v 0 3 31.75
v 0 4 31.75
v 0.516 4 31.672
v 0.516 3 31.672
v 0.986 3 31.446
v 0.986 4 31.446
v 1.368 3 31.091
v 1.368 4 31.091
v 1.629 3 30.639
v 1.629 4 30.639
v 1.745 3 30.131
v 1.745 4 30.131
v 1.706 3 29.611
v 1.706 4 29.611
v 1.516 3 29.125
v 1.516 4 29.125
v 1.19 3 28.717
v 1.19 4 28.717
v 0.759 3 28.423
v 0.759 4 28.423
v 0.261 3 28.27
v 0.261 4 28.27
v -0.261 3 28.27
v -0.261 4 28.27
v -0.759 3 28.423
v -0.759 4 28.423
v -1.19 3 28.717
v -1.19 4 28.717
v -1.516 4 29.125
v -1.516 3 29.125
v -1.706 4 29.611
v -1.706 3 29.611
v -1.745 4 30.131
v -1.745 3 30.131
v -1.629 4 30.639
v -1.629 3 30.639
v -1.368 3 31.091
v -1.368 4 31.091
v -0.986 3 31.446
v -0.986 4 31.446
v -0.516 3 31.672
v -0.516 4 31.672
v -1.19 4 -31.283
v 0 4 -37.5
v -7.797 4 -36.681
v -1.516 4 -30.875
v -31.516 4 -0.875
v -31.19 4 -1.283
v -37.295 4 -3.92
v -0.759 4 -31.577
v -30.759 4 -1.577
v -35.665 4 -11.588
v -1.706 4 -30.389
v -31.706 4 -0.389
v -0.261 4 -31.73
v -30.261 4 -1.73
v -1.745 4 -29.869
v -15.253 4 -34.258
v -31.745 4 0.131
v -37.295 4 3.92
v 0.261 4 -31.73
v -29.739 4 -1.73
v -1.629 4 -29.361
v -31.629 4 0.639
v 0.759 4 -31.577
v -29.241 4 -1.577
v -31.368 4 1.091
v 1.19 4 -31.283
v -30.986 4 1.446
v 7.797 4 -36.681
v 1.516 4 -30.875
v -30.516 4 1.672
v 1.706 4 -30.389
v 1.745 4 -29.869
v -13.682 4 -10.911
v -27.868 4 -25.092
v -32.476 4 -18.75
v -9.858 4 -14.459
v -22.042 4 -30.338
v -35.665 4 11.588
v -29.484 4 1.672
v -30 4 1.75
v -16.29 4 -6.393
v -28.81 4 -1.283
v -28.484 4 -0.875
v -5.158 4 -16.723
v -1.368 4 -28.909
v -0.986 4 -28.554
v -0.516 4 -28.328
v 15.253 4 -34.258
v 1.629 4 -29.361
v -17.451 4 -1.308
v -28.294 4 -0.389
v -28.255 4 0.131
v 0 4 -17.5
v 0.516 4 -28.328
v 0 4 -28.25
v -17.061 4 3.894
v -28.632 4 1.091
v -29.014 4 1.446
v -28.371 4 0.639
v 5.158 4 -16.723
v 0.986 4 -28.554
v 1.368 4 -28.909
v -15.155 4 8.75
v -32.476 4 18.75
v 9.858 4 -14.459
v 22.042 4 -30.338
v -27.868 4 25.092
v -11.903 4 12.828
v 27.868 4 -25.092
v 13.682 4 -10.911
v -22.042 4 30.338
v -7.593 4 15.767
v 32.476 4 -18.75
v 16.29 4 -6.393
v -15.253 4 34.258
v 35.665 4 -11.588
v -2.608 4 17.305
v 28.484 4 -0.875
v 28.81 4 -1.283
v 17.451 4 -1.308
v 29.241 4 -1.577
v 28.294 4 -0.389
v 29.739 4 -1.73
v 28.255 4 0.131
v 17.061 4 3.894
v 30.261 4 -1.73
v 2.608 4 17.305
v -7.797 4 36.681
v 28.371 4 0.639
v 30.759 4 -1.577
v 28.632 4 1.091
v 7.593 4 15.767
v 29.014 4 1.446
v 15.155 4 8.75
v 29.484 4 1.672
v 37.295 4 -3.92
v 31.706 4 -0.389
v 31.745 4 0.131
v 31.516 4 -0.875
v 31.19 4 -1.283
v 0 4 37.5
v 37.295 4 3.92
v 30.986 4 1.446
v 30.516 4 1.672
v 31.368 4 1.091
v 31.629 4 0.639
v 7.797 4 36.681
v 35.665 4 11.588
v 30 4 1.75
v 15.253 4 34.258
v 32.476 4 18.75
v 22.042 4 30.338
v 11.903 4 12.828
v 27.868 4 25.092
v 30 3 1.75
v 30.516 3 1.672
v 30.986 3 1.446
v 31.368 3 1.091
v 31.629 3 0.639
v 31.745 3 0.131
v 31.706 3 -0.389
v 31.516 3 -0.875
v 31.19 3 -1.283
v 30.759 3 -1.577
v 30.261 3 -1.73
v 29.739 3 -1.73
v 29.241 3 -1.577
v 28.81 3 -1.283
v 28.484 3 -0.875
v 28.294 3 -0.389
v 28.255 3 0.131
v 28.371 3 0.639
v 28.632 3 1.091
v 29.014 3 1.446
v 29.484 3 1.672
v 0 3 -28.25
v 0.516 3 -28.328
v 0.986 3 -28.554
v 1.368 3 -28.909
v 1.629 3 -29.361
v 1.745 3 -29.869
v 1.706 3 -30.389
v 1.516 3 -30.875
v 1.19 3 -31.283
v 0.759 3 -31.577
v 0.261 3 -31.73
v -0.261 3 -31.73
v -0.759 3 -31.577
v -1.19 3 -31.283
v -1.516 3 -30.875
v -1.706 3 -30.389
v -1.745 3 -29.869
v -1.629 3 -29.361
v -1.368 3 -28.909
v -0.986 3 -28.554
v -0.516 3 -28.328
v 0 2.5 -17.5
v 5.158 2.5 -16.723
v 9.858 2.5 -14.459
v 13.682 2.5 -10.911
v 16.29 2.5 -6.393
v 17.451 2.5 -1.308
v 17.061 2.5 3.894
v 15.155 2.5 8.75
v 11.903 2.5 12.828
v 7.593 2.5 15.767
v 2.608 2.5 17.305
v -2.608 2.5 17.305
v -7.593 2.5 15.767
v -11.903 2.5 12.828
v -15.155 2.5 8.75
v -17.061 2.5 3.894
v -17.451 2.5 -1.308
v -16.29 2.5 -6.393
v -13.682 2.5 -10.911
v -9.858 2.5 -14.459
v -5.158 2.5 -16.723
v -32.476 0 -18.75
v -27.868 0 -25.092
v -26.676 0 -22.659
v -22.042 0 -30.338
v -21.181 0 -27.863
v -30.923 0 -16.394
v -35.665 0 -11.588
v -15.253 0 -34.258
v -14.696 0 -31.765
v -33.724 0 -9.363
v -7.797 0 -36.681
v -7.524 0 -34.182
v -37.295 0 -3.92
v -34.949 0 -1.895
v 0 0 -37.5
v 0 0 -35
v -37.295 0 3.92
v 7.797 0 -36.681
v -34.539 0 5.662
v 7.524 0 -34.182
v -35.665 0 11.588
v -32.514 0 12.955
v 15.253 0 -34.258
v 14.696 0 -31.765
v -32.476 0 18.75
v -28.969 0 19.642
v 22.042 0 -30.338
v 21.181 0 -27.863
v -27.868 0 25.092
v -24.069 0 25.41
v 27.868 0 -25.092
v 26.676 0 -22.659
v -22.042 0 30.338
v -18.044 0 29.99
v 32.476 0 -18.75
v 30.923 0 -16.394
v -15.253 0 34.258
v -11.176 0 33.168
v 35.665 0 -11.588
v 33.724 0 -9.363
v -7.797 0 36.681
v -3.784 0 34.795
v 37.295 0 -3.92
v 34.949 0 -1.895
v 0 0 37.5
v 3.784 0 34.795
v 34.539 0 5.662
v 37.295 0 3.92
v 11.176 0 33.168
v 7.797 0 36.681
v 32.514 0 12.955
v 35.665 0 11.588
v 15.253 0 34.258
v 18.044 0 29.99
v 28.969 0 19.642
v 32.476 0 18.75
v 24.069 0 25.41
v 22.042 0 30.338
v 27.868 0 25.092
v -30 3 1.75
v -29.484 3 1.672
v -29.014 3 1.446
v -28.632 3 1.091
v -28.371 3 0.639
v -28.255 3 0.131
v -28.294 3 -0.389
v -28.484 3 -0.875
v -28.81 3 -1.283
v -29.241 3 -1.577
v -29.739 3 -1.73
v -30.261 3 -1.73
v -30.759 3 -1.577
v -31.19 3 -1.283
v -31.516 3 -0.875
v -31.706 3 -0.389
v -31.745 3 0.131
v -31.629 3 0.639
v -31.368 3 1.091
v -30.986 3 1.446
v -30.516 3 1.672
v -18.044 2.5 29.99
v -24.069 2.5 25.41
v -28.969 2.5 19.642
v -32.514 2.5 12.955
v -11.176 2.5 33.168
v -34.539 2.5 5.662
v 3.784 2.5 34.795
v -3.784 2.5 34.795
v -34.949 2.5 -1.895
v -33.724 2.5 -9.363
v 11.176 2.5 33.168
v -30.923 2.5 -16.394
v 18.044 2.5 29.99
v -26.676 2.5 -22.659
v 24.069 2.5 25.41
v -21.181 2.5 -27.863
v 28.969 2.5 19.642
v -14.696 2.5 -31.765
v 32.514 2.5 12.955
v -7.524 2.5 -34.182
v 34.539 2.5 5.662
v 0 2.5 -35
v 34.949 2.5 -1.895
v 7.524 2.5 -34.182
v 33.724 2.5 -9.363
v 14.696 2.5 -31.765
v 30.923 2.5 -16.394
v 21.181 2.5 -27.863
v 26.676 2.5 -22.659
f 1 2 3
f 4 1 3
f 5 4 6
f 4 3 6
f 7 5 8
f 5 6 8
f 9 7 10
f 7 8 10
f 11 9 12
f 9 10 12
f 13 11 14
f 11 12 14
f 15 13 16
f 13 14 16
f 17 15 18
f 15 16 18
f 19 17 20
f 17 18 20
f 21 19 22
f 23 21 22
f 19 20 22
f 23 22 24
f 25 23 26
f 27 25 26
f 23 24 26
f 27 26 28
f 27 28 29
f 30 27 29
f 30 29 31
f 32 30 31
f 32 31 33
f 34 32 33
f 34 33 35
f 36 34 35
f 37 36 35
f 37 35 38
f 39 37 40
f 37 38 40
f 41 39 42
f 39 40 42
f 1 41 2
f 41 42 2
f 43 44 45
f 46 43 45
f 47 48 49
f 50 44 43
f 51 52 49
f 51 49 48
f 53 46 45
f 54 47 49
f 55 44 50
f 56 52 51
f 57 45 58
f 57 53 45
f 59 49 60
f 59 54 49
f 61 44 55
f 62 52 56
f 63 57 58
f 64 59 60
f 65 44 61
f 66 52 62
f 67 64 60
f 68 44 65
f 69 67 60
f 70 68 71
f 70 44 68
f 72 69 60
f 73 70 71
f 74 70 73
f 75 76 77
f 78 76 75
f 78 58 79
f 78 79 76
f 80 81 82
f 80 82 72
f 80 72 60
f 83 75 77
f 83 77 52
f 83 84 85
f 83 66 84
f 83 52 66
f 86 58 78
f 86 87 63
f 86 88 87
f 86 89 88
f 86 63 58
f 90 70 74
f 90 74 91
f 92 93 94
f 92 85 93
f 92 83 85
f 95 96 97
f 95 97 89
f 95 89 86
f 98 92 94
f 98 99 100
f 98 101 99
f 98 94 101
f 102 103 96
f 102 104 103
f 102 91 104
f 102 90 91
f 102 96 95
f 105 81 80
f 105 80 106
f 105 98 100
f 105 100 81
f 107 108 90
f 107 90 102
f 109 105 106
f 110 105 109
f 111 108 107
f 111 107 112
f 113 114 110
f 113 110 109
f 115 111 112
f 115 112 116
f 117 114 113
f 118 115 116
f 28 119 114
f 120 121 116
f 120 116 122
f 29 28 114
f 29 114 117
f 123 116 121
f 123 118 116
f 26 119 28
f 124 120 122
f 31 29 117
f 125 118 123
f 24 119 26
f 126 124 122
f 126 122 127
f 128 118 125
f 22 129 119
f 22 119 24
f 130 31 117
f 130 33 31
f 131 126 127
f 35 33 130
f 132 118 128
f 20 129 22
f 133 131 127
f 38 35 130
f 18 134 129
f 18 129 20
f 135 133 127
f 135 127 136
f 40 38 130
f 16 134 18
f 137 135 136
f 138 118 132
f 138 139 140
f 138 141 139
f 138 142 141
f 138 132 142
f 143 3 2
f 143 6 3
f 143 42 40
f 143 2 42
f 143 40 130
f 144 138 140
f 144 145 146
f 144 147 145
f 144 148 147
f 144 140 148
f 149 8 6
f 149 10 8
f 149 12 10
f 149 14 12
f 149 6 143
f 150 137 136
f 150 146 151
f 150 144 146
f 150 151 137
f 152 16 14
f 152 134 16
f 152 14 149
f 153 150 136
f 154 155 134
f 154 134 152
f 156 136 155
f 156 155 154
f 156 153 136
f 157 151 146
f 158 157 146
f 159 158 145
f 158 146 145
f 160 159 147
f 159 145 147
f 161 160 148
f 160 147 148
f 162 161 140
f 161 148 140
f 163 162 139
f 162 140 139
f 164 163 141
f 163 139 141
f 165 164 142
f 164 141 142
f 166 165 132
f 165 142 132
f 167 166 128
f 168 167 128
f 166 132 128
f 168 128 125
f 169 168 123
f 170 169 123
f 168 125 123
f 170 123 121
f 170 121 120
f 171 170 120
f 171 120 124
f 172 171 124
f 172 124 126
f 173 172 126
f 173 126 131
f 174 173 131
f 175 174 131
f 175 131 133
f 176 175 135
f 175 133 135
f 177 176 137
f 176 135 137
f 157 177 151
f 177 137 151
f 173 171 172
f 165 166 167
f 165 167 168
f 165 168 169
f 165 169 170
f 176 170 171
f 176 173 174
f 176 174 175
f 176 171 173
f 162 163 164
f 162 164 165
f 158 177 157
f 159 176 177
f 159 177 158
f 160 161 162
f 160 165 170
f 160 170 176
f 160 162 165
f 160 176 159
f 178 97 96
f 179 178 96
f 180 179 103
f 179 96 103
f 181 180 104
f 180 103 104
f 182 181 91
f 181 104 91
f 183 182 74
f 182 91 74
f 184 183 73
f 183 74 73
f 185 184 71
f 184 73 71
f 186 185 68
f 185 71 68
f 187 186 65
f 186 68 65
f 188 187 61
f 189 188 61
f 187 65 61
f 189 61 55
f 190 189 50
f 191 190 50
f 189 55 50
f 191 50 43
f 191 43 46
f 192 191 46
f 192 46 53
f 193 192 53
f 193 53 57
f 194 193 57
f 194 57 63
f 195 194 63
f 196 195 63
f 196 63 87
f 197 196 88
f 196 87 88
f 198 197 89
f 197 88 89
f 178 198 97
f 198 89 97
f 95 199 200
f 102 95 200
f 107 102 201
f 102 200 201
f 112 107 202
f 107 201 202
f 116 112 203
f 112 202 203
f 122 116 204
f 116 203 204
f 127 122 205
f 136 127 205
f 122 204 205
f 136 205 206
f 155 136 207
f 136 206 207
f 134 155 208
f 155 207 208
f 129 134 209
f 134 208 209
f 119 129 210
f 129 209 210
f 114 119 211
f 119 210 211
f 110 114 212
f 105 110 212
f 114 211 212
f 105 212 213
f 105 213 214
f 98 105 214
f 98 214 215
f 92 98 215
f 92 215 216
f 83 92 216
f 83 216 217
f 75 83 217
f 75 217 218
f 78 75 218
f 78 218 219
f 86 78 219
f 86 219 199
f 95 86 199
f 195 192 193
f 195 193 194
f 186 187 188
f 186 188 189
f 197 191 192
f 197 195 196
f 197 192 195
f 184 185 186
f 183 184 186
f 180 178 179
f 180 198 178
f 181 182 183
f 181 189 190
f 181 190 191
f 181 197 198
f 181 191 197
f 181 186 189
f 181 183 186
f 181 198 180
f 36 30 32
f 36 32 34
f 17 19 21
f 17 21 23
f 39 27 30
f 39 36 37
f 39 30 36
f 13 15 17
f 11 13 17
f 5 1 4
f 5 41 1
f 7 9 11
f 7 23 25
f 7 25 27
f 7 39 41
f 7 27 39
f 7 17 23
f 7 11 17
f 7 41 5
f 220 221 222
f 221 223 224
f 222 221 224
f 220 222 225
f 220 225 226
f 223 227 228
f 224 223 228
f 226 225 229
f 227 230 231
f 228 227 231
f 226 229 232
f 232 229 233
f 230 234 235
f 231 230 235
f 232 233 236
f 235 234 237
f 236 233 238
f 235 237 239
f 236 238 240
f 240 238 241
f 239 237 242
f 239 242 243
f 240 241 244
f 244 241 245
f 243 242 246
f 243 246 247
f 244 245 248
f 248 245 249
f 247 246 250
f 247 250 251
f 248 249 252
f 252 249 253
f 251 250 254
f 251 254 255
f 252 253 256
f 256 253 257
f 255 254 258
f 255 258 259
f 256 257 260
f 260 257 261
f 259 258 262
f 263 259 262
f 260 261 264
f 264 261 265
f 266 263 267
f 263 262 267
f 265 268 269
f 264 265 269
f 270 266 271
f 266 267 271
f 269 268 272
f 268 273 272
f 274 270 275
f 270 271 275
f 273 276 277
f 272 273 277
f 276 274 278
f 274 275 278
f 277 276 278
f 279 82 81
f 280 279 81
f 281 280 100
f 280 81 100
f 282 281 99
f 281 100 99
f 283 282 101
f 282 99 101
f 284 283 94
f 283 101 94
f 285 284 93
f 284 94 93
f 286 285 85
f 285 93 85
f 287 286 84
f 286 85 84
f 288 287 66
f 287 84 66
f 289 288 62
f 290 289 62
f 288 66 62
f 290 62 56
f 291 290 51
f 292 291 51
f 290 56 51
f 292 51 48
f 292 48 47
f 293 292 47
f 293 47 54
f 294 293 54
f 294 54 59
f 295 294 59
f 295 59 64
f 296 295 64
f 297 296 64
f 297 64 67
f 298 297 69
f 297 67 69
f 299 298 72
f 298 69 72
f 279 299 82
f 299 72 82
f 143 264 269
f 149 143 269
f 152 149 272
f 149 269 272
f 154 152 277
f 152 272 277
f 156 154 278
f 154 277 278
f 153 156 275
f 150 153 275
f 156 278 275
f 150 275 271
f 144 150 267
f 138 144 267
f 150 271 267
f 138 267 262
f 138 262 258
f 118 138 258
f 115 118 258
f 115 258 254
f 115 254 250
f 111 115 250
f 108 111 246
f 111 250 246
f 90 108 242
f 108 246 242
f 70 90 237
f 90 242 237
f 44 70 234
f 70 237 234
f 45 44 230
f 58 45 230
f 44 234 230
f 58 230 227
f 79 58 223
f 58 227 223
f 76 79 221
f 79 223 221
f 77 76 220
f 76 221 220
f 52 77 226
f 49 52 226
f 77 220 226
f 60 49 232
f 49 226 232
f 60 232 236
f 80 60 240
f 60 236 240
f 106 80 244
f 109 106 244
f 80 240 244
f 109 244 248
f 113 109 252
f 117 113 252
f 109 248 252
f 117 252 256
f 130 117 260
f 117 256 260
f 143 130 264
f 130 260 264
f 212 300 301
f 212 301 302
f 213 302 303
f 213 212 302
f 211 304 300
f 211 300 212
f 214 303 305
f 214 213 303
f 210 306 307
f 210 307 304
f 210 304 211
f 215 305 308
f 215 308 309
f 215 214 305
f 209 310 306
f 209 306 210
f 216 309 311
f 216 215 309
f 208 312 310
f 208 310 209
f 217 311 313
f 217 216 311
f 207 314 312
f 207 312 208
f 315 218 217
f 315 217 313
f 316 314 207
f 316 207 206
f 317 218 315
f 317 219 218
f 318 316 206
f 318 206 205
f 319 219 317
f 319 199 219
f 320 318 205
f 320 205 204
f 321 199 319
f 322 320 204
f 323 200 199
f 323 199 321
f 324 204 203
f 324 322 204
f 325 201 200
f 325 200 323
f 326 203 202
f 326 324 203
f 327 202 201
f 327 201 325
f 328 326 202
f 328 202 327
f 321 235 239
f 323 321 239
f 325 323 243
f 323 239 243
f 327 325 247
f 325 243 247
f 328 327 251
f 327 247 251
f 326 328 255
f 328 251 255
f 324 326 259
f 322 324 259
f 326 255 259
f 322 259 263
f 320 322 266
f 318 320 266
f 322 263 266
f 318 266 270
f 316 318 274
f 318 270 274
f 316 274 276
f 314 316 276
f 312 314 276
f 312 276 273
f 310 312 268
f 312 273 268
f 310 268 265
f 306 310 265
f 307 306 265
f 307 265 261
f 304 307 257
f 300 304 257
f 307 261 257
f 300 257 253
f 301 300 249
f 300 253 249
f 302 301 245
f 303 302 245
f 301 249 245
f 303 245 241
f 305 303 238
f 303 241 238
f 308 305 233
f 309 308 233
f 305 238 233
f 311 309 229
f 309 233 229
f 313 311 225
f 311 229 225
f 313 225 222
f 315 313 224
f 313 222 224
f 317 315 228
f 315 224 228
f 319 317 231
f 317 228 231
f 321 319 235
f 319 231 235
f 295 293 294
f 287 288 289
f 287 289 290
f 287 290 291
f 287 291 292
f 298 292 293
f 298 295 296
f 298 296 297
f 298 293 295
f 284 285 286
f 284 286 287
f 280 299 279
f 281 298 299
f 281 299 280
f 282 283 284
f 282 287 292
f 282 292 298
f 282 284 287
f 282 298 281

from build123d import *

# Parameters (mm, degrees)
SKETCH1_R           = 37.5
BOSS_EXTRUDE1_DEPTH = 4
SKETCH2_R           = 1.75
CUT_EXTRUDE1_DEPTH  = 1
SKETCH3_R           = 35
CUT_EXTRUDE5_DEPTH  = 2.5
SKETCH4_R           = 17.5
CUT_EXTRUDE6_DEPTH  = 54.091901454


with BuildPart() as part:
    # Sketch1 → Boss-Extrude1 (new body)
    with BuildSketch(Plane(origin=(0, 0, 0), x_dir=(1, 0, 0), z_dir=(0, 1, 0))):
        with Locations(Location((0, 0, 0), (0, 0, 270))):
            Circle(SKETCH1_R)
    extrude(amount=BOSS_EXTRUDE1_DEPTH)

    # Sketch2 → Cut-Extrude1 (cut)
    with BuildSketch(Plane(origin=(0, 4, 0), x_dir=(1, 0, 0), z_dir=(0, 1, 0))):
        with Locations(Location((0, 30, 0), (0, 0, 270))):
            Circle(SKETCH2_R)
        with Locations(Location((30, 0, 0), (0, 0, 270))):
            Circle(SKETCH2_R)
        with Locations(Location((0, -30, 0), (0, 0, 270))):
            Circle(SKETCH2_R)
        with Locations(Location((-30, 0, 0), (0, 0, 270))):
            Circle(SKETCH2_R)
    extrude(amount=-CUT_EXTRUDE1_DEPTH, mode=Mode.SUBTRACT)

    # Sketch3 → Cut-Extrude5 (cut)
    with BuildSketch(Plane(origin=(0, 0, 0), x_dir=(-1, 0, 0), z_dir=(0, -1, 0))):
        with Locations(Location((0, 0, 0), (0, 0, 90))):
            Circle(SKETCH3_R)
    extrude(amount=-CUT_EXTRUDE5_DEPTH, mode=Mode.SUBTRACT)

    # Sketch4 → Cut-Extrude6 (cut, through all)
    with BuildSketch(Plane(origin=(0, 2.5, 0), x_dir=(-1, 0, 0), z_dir=(0, -1, 0))):
        with Locations(Location((0, 0, 0), (0, 0, 90))):
            Circle(SKETCH4_R)
    extrude(amount=-CUT_EXTRUDE6_DEPTH, mode=Mode.SUBTRACT)


solid = part.part
